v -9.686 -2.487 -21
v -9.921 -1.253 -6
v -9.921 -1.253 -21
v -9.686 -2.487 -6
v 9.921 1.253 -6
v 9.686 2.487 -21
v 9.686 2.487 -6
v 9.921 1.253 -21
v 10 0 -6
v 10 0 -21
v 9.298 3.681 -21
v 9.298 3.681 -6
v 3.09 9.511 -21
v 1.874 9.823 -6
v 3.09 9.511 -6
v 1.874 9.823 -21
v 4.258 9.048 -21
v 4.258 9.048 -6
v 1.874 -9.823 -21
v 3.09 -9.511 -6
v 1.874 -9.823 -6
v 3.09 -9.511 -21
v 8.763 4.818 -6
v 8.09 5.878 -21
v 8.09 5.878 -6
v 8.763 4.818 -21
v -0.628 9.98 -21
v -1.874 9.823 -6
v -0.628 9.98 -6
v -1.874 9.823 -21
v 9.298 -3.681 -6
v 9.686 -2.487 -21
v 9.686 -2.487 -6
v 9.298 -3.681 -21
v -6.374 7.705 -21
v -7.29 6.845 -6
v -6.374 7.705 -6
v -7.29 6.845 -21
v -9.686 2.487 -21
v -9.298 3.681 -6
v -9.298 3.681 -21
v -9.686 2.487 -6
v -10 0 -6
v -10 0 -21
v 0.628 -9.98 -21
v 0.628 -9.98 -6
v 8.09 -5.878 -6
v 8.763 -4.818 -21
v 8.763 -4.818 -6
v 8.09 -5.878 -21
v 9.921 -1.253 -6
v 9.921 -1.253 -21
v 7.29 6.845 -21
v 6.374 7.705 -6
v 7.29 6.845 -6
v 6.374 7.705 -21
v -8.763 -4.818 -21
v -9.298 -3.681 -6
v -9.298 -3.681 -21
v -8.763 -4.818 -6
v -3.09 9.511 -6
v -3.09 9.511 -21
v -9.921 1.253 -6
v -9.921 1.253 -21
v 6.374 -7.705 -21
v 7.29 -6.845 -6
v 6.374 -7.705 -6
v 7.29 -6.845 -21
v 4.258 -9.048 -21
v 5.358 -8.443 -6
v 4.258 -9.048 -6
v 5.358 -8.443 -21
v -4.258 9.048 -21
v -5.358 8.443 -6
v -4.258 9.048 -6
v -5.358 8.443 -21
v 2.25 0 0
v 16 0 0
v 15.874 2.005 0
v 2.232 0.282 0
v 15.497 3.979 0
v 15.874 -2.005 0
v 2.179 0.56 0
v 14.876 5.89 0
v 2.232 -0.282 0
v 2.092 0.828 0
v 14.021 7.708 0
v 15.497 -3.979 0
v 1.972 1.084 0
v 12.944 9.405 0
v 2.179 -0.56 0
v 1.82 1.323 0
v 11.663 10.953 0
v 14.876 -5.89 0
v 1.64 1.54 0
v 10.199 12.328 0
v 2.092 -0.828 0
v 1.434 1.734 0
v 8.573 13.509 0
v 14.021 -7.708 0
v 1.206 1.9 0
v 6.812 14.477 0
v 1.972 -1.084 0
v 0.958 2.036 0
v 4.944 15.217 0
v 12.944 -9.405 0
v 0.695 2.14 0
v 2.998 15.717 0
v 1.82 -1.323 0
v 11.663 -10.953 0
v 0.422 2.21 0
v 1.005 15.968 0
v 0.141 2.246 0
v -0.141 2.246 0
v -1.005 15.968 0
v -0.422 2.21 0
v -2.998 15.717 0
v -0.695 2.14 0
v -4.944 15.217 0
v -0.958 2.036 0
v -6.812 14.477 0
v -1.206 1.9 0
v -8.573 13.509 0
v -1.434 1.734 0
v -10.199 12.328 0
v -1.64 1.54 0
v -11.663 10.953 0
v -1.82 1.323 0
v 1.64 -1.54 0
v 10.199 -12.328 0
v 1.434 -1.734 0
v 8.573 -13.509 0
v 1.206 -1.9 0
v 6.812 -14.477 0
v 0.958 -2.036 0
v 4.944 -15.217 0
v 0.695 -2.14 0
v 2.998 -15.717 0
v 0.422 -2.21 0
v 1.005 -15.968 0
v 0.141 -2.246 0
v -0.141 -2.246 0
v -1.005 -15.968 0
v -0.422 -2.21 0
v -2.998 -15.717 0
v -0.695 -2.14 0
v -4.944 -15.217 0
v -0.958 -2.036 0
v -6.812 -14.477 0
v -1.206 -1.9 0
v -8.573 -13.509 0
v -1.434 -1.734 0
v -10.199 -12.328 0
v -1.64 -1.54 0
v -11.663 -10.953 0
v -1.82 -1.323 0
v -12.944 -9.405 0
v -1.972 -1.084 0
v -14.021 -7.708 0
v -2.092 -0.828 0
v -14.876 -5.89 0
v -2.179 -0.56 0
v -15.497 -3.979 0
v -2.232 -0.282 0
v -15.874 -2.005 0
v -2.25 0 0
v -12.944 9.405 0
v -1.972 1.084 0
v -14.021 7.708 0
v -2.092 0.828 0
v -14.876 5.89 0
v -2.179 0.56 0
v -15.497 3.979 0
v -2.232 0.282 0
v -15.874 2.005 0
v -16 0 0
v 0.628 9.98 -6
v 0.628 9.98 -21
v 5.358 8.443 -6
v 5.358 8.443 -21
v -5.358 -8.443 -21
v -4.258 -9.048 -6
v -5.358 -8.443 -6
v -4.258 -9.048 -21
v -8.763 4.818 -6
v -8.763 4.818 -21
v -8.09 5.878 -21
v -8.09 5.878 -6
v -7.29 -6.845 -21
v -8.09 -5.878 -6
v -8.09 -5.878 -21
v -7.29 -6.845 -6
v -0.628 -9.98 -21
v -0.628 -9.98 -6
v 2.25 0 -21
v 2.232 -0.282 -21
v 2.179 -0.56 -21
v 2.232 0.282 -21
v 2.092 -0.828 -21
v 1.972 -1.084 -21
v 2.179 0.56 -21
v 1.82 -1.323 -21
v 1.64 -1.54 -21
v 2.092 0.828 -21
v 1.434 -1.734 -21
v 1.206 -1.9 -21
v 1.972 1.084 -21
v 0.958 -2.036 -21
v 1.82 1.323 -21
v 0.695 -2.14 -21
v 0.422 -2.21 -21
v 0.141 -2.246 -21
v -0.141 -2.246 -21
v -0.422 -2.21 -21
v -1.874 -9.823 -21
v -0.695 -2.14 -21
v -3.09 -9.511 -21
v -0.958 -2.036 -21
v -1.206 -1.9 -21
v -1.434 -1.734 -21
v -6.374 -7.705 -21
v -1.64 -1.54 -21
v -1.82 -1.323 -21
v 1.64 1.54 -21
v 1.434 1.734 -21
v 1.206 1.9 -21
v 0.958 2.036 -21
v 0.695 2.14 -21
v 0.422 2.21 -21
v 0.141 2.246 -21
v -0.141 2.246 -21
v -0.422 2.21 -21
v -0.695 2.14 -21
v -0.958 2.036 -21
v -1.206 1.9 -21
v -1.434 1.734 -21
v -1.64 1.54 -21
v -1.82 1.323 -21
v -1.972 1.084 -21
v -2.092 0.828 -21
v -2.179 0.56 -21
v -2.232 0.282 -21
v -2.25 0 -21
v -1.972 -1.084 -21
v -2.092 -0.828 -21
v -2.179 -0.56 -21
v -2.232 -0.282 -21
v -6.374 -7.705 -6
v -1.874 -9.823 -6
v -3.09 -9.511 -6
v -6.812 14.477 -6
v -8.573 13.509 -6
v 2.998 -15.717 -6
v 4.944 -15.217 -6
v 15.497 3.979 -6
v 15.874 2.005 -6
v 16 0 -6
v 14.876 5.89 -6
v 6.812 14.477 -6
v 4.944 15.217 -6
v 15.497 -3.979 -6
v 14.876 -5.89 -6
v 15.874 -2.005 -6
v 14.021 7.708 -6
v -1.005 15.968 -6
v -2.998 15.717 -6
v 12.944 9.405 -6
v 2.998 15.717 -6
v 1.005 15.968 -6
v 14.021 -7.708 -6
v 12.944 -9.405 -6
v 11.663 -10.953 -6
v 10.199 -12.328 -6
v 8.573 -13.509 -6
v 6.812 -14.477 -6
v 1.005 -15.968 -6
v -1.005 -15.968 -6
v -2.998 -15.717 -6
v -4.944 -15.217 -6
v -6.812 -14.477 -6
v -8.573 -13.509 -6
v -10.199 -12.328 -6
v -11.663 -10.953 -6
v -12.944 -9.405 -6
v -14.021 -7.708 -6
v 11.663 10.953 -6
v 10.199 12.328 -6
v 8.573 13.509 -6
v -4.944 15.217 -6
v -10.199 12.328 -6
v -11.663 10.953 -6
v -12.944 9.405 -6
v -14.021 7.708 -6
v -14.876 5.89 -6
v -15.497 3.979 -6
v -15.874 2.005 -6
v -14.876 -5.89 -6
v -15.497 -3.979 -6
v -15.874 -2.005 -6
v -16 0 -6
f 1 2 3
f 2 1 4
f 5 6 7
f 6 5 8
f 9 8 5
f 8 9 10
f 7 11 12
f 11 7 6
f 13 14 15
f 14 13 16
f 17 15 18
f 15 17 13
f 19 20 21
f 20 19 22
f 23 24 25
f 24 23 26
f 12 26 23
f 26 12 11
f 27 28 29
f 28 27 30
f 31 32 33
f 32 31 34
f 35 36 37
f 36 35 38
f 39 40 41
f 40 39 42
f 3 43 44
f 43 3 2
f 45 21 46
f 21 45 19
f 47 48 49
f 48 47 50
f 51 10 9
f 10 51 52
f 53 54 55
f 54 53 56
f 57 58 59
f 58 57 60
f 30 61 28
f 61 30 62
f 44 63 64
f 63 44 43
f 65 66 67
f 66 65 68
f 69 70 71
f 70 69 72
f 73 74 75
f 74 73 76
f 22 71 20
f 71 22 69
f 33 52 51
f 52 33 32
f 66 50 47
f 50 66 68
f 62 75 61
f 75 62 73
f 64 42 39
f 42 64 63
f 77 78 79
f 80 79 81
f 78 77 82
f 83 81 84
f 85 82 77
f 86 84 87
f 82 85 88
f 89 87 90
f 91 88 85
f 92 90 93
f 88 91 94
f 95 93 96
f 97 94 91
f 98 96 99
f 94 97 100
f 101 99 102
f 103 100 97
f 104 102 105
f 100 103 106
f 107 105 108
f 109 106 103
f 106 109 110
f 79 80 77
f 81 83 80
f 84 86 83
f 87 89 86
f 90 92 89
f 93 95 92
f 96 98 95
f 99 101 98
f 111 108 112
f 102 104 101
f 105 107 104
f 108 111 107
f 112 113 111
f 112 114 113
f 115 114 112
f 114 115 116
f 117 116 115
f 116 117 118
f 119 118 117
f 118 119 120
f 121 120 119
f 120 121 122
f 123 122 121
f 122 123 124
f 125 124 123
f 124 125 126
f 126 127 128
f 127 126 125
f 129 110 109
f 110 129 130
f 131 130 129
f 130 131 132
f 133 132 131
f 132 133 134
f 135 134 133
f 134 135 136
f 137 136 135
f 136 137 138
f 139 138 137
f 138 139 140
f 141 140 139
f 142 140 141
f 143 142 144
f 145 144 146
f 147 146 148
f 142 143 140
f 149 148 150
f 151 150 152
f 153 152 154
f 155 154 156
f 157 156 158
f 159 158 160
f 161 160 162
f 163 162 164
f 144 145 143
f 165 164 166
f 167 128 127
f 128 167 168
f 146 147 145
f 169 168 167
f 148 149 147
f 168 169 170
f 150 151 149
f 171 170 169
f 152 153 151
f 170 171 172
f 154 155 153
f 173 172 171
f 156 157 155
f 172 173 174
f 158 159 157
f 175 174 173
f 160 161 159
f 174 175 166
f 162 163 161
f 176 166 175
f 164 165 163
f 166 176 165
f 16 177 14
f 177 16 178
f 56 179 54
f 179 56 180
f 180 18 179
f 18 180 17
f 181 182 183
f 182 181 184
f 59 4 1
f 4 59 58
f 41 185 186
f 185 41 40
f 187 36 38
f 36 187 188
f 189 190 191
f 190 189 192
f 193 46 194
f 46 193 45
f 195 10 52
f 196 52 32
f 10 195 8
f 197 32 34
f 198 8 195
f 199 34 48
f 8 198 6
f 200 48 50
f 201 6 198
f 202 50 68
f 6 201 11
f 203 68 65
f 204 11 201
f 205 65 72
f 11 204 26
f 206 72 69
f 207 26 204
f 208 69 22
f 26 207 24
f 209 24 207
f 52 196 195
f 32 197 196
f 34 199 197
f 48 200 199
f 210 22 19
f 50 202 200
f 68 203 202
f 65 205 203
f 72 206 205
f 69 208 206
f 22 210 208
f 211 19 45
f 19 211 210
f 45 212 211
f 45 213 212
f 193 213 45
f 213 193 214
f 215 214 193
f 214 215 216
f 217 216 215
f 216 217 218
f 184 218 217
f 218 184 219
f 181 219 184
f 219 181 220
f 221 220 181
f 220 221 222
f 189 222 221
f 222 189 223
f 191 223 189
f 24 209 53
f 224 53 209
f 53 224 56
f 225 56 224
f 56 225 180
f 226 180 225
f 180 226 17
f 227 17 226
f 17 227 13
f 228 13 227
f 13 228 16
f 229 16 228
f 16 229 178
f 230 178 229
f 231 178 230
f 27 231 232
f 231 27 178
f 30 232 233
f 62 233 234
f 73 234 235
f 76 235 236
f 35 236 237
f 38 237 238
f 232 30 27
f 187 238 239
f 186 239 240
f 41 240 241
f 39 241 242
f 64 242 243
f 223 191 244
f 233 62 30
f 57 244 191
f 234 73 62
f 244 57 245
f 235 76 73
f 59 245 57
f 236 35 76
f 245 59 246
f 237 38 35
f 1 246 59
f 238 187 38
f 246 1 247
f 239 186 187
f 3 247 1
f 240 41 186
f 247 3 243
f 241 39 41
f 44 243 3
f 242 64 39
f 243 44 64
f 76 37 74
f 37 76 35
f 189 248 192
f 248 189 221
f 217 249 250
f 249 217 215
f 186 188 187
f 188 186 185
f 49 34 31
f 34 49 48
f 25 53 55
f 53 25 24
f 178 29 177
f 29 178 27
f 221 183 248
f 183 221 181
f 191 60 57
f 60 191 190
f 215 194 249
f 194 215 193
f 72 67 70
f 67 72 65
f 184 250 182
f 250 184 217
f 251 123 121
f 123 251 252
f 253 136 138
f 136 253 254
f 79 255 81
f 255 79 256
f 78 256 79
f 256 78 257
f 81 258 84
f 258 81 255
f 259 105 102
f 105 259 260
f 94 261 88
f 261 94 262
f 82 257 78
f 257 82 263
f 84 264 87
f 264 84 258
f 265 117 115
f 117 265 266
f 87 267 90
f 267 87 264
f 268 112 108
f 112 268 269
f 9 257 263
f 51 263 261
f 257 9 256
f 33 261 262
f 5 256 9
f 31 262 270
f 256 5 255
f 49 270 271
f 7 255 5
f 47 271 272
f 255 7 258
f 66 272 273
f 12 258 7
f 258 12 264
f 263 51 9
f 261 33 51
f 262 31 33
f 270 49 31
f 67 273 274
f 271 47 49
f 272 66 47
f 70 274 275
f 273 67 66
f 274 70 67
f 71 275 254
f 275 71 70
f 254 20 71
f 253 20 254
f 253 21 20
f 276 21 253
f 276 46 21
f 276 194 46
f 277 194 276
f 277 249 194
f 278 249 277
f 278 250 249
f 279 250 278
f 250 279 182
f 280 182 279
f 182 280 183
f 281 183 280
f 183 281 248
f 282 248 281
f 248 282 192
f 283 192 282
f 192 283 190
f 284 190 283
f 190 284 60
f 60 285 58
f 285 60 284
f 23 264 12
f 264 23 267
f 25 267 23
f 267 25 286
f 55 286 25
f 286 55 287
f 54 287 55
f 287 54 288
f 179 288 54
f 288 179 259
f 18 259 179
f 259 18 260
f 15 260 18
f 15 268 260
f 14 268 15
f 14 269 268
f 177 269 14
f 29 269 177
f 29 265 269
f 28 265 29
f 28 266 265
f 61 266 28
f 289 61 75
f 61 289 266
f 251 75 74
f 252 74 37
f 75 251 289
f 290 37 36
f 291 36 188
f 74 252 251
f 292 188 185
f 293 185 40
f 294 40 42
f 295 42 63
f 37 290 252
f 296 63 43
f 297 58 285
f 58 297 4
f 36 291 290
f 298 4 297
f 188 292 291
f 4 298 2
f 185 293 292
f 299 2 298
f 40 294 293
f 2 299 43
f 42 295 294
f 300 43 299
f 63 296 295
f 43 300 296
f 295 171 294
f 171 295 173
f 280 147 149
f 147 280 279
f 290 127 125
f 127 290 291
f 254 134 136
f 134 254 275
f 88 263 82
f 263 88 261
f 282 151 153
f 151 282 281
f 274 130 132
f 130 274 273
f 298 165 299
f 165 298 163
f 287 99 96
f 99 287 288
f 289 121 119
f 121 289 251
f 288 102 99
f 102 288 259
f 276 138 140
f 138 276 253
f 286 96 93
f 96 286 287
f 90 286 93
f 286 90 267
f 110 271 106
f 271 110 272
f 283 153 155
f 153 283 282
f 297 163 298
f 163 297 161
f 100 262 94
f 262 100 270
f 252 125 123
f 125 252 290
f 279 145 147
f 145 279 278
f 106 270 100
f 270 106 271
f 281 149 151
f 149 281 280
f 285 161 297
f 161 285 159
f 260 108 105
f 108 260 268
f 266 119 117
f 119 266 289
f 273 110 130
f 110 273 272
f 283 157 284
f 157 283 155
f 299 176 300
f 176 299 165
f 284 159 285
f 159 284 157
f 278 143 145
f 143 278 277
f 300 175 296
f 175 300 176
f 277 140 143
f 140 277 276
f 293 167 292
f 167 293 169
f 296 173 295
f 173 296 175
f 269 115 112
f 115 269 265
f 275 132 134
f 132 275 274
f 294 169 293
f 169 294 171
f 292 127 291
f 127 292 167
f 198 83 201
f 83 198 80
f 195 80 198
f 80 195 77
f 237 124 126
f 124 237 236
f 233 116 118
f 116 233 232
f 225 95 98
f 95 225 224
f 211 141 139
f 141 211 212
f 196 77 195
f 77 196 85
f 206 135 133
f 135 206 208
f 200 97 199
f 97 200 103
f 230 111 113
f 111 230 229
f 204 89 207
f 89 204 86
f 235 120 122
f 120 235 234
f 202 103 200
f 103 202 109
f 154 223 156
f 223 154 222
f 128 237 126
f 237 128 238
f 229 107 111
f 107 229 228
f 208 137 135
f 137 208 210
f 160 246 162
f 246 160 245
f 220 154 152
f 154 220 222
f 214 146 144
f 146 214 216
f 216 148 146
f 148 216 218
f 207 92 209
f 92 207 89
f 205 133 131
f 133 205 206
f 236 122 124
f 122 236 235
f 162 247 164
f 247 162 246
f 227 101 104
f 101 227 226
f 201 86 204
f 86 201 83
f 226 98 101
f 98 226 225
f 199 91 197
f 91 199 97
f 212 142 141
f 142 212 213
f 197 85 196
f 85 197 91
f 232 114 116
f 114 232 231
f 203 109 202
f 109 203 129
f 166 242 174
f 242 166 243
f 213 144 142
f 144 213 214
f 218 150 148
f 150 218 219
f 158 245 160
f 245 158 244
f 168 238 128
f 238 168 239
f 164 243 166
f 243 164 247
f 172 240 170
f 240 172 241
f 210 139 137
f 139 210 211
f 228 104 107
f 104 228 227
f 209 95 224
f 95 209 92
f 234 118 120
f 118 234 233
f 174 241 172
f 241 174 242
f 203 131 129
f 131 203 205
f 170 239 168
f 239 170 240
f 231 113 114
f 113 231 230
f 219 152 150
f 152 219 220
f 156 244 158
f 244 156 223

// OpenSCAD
$fn = 50;


difference() {
	union() {
		translate(v = [0, 0, -21.0000000000]) {
			cylinder(h = 21, r = 10.0000000000);
		}
		translate(v = [0, 0, -6.0000000000]) {
			cylinder(h = 6, r = 16.0000000000);
		}
	}
	union() {
		#translate(v = [0, 0, -21]) {
			cylinder(h = 21, r = 2.2500000000);
		}
	}
}
